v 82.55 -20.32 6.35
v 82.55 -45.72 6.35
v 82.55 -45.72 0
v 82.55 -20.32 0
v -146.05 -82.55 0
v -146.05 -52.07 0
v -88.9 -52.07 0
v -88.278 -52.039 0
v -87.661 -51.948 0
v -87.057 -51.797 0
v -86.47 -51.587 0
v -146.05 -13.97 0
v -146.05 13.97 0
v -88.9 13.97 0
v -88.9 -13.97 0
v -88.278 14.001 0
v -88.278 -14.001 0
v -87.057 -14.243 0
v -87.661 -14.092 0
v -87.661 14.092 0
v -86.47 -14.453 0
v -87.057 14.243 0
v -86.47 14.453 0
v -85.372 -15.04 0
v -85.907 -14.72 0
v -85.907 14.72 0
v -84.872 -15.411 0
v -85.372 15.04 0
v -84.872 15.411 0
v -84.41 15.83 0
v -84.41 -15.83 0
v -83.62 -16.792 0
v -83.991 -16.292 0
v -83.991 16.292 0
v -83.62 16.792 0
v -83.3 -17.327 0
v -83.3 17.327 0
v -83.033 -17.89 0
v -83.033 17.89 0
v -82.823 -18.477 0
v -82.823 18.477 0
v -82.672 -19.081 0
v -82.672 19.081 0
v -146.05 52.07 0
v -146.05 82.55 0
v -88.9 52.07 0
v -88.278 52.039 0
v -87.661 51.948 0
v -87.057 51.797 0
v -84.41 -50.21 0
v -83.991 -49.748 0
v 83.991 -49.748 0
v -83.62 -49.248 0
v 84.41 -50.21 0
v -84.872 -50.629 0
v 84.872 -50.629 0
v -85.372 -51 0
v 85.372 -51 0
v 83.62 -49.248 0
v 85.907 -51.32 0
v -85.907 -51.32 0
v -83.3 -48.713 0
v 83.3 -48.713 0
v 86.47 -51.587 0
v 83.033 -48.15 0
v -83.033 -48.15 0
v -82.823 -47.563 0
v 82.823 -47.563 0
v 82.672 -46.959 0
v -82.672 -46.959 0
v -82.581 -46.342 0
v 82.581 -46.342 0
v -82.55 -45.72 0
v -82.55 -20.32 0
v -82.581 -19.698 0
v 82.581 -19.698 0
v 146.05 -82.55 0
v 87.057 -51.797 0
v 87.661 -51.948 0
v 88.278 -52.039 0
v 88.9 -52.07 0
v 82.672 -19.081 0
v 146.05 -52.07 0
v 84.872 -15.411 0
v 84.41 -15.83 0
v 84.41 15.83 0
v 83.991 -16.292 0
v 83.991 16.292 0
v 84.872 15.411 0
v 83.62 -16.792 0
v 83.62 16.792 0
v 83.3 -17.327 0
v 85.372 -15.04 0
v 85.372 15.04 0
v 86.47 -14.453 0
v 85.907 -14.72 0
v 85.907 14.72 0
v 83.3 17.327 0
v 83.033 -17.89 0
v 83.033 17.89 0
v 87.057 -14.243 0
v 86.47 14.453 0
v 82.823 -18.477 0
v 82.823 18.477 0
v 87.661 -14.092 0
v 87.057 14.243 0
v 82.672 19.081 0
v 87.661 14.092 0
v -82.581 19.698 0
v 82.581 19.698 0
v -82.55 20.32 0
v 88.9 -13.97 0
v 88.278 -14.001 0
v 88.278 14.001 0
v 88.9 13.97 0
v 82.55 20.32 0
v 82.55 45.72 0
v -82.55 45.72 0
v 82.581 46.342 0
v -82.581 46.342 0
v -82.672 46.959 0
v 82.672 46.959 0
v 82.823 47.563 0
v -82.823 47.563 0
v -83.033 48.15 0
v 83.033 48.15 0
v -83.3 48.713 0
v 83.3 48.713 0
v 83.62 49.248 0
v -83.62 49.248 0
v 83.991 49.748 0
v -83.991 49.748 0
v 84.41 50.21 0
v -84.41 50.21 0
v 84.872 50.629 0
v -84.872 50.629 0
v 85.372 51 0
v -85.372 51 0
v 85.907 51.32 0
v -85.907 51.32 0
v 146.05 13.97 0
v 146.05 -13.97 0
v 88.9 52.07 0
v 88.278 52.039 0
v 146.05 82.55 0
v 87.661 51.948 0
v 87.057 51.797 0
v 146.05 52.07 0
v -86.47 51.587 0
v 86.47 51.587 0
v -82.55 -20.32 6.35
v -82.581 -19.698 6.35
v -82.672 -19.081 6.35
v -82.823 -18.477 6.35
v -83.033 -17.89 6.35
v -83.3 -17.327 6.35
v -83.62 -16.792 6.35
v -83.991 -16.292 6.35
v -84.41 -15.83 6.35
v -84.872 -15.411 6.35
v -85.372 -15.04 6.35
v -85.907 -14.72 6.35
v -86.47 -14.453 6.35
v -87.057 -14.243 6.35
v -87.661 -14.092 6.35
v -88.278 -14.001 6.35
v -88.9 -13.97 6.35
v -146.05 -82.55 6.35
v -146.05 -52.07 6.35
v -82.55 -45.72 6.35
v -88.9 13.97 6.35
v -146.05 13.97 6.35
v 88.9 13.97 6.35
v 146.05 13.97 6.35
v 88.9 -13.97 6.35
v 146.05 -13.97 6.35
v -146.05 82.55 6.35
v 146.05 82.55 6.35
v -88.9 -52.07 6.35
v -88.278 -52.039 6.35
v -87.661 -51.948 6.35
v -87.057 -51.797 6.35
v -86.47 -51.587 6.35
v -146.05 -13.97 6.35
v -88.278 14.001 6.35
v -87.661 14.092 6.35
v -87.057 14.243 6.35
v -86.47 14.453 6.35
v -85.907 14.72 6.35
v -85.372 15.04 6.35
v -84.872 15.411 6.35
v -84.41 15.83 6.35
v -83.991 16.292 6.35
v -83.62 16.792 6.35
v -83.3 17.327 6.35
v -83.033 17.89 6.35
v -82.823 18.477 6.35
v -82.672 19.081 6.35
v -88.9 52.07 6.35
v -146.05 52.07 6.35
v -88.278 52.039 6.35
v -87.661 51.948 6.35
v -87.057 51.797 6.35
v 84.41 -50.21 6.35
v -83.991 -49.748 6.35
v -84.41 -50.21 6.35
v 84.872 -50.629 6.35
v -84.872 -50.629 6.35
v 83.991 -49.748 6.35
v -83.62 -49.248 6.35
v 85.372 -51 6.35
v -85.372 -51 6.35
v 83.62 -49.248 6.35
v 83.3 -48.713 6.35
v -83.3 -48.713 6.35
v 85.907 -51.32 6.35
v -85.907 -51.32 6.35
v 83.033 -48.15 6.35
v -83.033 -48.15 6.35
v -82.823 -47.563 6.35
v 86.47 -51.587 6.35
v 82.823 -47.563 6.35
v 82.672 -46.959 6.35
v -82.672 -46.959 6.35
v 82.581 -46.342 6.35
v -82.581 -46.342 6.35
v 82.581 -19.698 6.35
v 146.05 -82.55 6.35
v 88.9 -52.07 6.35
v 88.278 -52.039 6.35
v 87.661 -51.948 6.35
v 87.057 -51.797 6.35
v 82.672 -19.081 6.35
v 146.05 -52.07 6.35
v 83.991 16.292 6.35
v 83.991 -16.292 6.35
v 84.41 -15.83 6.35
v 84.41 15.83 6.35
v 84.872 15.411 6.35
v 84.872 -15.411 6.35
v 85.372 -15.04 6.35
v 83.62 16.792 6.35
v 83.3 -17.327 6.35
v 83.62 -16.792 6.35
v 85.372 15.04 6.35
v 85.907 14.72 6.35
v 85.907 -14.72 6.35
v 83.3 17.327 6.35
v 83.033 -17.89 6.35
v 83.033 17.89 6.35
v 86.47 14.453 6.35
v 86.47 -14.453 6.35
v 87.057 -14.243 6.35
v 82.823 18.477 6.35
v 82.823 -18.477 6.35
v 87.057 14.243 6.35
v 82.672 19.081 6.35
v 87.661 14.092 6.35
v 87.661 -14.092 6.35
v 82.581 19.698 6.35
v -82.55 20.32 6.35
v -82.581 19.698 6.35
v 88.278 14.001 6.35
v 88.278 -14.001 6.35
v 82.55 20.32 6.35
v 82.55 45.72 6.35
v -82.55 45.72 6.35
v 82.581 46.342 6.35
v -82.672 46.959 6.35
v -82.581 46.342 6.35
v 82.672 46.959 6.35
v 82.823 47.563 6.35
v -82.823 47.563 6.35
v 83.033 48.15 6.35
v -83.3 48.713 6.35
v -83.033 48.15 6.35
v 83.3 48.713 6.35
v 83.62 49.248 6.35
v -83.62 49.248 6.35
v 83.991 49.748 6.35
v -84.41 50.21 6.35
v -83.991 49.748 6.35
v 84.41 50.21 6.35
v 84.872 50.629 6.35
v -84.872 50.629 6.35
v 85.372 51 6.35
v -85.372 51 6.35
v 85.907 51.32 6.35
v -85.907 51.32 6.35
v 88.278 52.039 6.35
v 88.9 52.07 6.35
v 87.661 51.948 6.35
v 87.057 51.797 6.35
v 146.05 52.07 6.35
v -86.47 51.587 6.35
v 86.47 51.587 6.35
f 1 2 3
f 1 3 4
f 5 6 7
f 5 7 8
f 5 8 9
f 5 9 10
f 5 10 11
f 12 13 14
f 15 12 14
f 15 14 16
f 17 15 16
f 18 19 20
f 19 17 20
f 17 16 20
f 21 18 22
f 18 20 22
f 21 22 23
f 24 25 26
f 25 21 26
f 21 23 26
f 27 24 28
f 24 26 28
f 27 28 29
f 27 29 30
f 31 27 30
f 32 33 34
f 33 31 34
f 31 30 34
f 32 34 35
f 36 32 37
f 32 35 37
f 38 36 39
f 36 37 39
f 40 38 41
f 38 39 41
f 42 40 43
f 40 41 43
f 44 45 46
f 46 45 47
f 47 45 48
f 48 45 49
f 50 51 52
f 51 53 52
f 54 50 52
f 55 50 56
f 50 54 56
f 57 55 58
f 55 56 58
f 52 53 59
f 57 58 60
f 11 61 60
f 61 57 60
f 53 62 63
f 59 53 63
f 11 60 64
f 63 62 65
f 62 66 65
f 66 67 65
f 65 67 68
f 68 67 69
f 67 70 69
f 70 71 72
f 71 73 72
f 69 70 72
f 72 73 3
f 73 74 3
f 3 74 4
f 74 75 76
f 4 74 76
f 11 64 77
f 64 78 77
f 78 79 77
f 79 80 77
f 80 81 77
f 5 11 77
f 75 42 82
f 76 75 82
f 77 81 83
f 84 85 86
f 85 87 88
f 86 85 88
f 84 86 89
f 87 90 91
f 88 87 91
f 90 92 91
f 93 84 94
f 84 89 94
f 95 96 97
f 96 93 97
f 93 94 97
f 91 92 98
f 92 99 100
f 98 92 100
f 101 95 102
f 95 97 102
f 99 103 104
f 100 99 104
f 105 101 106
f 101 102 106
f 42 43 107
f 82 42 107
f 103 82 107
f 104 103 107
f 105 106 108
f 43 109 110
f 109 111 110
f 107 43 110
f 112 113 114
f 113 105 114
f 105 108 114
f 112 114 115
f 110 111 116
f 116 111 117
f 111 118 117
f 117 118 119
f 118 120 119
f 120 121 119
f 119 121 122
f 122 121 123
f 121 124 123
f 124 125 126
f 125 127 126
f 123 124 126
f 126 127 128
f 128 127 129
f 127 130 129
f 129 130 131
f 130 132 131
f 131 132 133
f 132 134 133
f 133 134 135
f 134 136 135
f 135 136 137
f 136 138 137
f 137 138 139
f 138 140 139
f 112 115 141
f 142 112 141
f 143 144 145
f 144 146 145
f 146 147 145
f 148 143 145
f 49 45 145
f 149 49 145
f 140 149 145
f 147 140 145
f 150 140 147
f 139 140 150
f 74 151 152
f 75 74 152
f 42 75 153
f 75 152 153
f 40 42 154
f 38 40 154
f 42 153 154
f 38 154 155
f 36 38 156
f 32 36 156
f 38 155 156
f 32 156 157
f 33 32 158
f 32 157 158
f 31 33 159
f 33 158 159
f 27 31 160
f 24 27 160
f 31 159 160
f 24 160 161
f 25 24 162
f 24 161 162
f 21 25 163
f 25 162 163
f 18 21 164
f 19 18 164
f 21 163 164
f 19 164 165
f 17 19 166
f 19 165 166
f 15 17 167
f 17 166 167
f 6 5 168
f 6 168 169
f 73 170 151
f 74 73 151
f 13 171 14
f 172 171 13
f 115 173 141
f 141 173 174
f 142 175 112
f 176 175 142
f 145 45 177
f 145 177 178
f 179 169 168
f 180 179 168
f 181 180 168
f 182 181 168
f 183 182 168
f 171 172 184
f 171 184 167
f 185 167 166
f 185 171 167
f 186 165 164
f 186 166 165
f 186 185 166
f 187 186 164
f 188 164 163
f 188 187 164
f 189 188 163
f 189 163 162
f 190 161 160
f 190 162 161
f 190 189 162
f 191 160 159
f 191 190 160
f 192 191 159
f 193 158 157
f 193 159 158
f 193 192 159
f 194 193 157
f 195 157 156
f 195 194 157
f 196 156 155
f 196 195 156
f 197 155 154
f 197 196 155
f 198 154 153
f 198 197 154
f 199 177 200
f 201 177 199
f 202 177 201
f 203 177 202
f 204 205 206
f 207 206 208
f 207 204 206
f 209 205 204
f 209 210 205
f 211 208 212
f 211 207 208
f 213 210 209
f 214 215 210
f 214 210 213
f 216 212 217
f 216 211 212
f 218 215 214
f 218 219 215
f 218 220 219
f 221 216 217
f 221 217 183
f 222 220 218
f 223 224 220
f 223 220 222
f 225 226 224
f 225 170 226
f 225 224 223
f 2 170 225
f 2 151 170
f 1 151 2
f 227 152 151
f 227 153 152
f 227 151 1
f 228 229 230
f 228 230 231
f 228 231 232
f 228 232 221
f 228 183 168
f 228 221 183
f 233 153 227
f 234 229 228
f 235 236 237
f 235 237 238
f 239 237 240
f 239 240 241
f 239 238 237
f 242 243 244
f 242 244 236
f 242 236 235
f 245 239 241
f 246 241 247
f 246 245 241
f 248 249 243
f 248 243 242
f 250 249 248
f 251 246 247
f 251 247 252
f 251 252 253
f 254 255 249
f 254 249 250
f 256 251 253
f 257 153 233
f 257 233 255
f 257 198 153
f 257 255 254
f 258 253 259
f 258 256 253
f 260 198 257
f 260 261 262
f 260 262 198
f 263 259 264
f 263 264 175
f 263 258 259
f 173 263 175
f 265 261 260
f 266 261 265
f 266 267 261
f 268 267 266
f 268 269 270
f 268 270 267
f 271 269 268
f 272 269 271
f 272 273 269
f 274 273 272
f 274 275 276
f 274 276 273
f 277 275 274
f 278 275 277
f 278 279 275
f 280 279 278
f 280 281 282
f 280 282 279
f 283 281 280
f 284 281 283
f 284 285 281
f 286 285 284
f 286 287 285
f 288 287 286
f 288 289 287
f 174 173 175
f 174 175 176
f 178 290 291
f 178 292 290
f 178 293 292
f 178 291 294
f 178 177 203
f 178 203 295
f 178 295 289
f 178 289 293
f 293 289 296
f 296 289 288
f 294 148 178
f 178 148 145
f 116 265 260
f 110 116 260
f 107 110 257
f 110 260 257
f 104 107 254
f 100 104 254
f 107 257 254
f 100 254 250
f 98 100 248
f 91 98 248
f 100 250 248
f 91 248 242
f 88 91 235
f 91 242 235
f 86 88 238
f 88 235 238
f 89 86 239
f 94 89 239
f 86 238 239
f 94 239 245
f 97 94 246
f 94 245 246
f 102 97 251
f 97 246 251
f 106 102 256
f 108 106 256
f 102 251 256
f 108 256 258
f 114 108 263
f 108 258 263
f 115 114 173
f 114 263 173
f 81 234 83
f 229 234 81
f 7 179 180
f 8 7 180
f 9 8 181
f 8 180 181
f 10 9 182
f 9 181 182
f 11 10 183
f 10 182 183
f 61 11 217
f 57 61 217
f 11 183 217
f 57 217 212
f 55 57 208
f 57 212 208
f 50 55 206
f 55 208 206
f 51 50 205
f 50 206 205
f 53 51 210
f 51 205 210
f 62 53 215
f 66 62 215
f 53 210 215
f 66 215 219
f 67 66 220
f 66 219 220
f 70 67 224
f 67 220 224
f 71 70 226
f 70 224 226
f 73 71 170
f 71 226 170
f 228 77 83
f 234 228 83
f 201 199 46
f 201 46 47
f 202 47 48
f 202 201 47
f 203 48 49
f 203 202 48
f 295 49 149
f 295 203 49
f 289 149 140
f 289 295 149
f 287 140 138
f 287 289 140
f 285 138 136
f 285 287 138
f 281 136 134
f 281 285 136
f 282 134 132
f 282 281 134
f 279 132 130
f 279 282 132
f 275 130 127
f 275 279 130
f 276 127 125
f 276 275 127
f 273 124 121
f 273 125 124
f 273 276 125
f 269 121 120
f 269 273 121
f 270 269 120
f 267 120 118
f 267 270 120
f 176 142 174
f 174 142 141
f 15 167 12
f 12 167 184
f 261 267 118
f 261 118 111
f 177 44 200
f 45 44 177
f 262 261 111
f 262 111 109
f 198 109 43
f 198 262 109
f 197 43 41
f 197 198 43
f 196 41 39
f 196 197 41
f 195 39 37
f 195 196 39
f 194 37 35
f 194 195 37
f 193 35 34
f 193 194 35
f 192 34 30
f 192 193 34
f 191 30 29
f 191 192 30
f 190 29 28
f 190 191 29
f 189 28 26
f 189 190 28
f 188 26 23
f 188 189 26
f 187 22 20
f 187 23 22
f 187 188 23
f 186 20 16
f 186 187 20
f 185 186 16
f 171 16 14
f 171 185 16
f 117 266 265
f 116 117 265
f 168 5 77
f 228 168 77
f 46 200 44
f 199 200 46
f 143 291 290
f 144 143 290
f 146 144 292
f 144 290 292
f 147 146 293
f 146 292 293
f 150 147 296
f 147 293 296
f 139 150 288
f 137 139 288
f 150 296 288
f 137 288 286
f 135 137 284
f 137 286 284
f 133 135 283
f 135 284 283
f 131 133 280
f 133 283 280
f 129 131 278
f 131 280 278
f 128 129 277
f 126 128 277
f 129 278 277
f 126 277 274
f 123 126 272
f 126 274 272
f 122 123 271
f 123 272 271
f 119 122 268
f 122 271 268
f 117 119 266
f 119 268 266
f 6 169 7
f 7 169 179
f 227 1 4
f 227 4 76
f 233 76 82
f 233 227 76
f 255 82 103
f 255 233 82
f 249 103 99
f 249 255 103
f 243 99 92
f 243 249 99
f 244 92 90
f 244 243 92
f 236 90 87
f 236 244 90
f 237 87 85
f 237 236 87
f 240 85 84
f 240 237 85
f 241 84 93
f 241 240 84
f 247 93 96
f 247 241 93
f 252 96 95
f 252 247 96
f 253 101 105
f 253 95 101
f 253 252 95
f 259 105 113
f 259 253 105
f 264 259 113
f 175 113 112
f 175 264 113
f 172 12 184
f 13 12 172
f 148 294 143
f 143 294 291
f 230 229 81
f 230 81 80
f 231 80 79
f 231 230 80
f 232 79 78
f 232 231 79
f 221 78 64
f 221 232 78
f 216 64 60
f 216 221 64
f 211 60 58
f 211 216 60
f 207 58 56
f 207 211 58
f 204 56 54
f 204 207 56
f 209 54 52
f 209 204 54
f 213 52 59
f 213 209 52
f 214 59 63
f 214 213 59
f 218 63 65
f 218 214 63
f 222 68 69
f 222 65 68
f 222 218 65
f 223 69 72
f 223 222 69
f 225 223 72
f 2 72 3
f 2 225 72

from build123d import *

# Parameters (mm, degrees)
SKETCH1_W           = 292.1
SKETCH1_H           = 165.1
BOSS_EXTRUDE1_DEPTH = 6.35
CUT_EXTRUDE1_DEPTH  = 168.885161643


with BuildPart() as part:
    # Sketch1 → Boss-Extrude1 (new body)
    with BuildSketch(Plane.XY):
        Rectangle(SKETCH1_W, SKETCH1_H)
    extrude(amount=BOSS_EXTRUDE1_DEPTH)

    # Sketch2 → Cut-Extrude1 (cut, through all)
    with BuildSketch(Plane.XY.offset(6.35)):
        with BuildLine():
            Line((-146.05, 52.07), (-88.9, 52.07))
            ThreePointArc((-88.9, 52.07), (-84.409871939, 50.210128061), (-82.55, 45.72))
            Line((-82.55, 45.72), (-82.55, 20.32))
            ThreePointArc((-82.55, 20.32), (-84.409871939, 15.829871939), (-88.9, 13.97))
            Line((-88.9, 13.97), (-146.05, 13.97))
            Line((-146.05, 13.97), (-146.05, 52.07))
        make_face()
        with BuildLine():
            Line((-146.05, -13.97), (-146.05, -52.07))
            Line((-146.05, -52.07), (-88.9, -52.07))
            ThreePointArc((-88.9, -52.07), (-84.409871939, -50.210128061), (-82.55, -45.72))
            Line((-82.55, -45.72), (-82.55, -20.32))
            ThreePointArc((-82.55, -20.32), (-84.409871939, -15.829871939), (-88.9, -13.97))
            Line((-88.9, -13.97), (-146.05, -13.97))
        make_face()
        with BuildLine():
            Line((146.05, -52.07), (88.9, -52.07))
            ThreePointArc((88.9, -52.07), (84.409871939, -50.210128061), (82.55, -45.72))
            Line((82.55, -45.72), (82.55, -20.32))
            ThreePointArc((82.55, -20.32), (84.409871939, -15.829871939), (88.9, -13.97))
            Line((88.9, -13.97), (146.05, -13.97))
            Line((146.05, -13.97), (146.05, -52.07))
        make_face()
        with BuildLine():
            Line((146.05, 13.97), (146.05, 52.07))
            Line((146.05, 52.07), (88.9, 52.07))
            ThreePointArc((88.9, 52.07), (84.409871939, 50.210128061), (82.55, 45.72))
            Line((82.55, 45.72), (82.55, 20.32))
            ThreePointArc((82.55, 20.32), (84.409871939, 15.829871939), (88.9, 13.97))
            Line((88.9, 13.97), (146.05, 13.97))
        make_face()
    extrude(amount=-CUT_EXTRUDE1_DEPTH, mode=Mode.SUBTRACT)


solid = part.part
